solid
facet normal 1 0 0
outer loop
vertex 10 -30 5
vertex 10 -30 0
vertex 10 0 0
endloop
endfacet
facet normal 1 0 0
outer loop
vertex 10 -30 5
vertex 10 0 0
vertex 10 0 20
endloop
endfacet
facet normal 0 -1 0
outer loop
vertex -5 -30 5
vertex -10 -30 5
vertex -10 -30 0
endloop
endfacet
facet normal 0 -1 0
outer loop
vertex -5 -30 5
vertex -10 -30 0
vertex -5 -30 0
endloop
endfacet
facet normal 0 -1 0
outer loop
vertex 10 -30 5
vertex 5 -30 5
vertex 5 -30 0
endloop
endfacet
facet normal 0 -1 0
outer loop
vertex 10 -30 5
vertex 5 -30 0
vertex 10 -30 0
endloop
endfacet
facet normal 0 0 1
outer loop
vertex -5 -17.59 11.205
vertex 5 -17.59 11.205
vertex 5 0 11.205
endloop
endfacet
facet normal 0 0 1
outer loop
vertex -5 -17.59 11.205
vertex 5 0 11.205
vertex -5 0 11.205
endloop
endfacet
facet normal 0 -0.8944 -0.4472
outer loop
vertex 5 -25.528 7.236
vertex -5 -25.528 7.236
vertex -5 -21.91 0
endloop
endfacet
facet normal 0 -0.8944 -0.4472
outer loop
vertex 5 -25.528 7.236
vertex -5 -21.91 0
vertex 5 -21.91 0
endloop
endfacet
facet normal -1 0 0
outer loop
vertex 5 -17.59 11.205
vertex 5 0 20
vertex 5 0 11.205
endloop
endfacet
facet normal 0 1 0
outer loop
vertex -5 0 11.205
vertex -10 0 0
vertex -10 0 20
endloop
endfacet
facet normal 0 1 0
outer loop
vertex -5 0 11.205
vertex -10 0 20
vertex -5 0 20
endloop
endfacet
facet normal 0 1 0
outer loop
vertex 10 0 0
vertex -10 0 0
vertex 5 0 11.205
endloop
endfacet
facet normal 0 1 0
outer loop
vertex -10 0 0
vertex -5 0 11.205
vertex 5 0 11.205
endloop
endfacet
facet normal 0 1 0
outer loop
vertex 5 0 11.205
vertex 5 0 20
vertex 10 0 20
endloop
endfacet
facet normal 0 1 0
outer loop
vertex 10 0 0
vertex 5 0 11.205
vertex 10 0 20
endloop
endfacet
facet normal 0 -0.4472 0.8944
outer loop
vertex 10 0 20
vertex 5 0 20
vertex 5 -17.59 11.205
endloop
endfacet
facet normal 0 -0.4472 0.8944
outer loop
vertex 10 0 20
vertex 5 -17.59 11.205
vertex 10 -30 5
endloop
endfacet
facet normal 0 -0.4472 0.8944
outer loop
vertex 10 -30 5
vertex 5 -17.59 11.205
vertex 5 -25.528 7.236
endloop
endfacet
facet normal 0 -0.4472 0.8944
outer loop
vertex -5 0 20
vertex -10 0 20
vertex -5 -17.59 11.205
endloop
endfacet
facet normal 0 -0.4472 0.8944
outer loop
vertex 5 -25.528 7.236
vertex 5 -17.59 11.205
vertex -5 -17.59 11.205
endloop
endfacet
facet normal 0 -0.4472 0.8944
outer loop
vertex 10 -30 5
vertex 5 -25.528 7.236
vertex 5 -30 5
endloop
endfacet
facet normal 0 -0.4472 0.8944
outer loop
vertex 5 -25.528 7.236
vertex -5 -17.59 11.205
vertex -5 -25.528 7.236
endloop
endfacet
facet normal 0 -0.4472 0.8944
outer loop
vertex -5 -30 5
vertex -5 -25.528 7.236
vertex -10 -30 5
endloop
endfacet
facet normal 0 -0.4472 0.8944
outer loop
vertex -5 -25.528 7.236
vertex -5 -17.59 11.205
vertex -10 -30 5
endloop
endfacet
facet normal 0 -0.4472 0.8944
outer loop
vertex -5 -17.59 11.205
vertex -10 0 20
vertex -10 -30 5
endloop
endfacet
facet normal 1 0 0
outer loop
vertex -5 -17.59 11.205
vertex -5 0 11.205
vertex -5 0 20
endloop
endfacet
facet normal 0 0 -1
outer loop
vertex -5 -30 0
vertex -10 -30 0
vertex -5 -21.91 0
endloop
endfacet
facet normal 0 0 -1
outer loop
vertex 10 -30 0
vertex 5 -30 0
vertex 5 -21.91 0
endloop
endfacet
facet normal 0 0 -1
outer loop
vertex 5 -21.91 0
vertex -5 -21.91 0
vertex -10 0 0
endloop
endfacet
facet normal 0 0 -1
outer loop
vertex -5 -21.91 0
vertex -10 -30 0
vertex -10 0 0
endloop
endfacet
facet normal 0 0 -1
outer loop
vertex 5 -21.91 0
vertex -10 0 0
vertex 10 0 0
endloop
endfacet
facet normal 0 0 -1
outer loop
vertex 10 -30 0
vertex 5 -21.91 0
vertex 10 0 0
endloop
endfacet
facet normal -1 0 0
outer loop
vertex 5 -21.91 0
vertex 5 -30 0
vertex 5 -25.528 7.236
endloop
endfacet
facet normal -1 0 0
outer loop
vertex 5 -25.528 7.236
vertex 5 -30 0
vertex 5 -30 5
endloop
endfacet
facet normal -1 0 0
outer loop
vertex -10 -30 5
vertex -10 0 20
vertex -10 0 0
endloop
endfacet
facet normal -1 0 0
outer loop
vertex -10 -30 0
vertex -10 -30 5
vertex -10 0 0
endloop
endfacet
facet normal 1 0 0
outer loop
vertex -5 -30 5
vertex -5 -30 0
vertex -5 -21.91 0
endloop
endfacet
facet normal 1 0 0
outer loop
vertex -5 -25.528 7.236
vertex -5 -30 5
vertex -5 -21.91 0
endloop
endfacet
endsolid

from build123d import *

# Parameters (mm, degrees)
F1_DEPTH = 30
F3_DEPTH = 20.001
F5_DEPTH = 5
F6_W     = 10
F6_H     = 5
F7_DEPTH = 17.88954382


with BuildPart() as f1:
    # F0 (on Front) → F1 (new body)
    with BuildSketch(Plane.XZ):
        Polygon((-10, 20), (-10, 0), (10, 0), (10, 20), (5, 20), (5, 11.2048187231), (-5, 11.2048187231), (-5, 20), align=None)
    extrude(amount=F1_DEPTH)

    # F2 (on face) → F3 (cut, through all)
    with BuildSketch(Plane(origin=(-10, 0, 0), x_dir=(0, -1, 0), z_dir=(-1, 0, 0))):
        Polygon((0, 20), (30, 5), (30, 20), align=None)
    extrude(amount=-F3_DEPTH, mode=Mode.SUBTRACT)

    # F4 (on face) → F5 (cut)
    with BuildSketch(Plane.XZ.offset(30)):
        Polygon((-5, 2.5), (-5, 0), (5, 0), (5, 2.5), (5, 5), (-5, 5), align=None)
    extrude(amount=-F5_DEPTH, mode=Mode.SUBTRACT)

    # F6 (on face) → F7 (cut, through all)
    with BuildSketch(Plane(origin=(0, -8, 16), x_dir=(1, 0, 0), z_dir=(0, -0.4472135955, 0.894427191))):
        with Locations((0, -22.0967477525)):
            Rectangle(F6_W, F6_H)
    extrude(amount=-F7_DEPTH, mode=Mode.SUBTRACT)


solid = f1.part
